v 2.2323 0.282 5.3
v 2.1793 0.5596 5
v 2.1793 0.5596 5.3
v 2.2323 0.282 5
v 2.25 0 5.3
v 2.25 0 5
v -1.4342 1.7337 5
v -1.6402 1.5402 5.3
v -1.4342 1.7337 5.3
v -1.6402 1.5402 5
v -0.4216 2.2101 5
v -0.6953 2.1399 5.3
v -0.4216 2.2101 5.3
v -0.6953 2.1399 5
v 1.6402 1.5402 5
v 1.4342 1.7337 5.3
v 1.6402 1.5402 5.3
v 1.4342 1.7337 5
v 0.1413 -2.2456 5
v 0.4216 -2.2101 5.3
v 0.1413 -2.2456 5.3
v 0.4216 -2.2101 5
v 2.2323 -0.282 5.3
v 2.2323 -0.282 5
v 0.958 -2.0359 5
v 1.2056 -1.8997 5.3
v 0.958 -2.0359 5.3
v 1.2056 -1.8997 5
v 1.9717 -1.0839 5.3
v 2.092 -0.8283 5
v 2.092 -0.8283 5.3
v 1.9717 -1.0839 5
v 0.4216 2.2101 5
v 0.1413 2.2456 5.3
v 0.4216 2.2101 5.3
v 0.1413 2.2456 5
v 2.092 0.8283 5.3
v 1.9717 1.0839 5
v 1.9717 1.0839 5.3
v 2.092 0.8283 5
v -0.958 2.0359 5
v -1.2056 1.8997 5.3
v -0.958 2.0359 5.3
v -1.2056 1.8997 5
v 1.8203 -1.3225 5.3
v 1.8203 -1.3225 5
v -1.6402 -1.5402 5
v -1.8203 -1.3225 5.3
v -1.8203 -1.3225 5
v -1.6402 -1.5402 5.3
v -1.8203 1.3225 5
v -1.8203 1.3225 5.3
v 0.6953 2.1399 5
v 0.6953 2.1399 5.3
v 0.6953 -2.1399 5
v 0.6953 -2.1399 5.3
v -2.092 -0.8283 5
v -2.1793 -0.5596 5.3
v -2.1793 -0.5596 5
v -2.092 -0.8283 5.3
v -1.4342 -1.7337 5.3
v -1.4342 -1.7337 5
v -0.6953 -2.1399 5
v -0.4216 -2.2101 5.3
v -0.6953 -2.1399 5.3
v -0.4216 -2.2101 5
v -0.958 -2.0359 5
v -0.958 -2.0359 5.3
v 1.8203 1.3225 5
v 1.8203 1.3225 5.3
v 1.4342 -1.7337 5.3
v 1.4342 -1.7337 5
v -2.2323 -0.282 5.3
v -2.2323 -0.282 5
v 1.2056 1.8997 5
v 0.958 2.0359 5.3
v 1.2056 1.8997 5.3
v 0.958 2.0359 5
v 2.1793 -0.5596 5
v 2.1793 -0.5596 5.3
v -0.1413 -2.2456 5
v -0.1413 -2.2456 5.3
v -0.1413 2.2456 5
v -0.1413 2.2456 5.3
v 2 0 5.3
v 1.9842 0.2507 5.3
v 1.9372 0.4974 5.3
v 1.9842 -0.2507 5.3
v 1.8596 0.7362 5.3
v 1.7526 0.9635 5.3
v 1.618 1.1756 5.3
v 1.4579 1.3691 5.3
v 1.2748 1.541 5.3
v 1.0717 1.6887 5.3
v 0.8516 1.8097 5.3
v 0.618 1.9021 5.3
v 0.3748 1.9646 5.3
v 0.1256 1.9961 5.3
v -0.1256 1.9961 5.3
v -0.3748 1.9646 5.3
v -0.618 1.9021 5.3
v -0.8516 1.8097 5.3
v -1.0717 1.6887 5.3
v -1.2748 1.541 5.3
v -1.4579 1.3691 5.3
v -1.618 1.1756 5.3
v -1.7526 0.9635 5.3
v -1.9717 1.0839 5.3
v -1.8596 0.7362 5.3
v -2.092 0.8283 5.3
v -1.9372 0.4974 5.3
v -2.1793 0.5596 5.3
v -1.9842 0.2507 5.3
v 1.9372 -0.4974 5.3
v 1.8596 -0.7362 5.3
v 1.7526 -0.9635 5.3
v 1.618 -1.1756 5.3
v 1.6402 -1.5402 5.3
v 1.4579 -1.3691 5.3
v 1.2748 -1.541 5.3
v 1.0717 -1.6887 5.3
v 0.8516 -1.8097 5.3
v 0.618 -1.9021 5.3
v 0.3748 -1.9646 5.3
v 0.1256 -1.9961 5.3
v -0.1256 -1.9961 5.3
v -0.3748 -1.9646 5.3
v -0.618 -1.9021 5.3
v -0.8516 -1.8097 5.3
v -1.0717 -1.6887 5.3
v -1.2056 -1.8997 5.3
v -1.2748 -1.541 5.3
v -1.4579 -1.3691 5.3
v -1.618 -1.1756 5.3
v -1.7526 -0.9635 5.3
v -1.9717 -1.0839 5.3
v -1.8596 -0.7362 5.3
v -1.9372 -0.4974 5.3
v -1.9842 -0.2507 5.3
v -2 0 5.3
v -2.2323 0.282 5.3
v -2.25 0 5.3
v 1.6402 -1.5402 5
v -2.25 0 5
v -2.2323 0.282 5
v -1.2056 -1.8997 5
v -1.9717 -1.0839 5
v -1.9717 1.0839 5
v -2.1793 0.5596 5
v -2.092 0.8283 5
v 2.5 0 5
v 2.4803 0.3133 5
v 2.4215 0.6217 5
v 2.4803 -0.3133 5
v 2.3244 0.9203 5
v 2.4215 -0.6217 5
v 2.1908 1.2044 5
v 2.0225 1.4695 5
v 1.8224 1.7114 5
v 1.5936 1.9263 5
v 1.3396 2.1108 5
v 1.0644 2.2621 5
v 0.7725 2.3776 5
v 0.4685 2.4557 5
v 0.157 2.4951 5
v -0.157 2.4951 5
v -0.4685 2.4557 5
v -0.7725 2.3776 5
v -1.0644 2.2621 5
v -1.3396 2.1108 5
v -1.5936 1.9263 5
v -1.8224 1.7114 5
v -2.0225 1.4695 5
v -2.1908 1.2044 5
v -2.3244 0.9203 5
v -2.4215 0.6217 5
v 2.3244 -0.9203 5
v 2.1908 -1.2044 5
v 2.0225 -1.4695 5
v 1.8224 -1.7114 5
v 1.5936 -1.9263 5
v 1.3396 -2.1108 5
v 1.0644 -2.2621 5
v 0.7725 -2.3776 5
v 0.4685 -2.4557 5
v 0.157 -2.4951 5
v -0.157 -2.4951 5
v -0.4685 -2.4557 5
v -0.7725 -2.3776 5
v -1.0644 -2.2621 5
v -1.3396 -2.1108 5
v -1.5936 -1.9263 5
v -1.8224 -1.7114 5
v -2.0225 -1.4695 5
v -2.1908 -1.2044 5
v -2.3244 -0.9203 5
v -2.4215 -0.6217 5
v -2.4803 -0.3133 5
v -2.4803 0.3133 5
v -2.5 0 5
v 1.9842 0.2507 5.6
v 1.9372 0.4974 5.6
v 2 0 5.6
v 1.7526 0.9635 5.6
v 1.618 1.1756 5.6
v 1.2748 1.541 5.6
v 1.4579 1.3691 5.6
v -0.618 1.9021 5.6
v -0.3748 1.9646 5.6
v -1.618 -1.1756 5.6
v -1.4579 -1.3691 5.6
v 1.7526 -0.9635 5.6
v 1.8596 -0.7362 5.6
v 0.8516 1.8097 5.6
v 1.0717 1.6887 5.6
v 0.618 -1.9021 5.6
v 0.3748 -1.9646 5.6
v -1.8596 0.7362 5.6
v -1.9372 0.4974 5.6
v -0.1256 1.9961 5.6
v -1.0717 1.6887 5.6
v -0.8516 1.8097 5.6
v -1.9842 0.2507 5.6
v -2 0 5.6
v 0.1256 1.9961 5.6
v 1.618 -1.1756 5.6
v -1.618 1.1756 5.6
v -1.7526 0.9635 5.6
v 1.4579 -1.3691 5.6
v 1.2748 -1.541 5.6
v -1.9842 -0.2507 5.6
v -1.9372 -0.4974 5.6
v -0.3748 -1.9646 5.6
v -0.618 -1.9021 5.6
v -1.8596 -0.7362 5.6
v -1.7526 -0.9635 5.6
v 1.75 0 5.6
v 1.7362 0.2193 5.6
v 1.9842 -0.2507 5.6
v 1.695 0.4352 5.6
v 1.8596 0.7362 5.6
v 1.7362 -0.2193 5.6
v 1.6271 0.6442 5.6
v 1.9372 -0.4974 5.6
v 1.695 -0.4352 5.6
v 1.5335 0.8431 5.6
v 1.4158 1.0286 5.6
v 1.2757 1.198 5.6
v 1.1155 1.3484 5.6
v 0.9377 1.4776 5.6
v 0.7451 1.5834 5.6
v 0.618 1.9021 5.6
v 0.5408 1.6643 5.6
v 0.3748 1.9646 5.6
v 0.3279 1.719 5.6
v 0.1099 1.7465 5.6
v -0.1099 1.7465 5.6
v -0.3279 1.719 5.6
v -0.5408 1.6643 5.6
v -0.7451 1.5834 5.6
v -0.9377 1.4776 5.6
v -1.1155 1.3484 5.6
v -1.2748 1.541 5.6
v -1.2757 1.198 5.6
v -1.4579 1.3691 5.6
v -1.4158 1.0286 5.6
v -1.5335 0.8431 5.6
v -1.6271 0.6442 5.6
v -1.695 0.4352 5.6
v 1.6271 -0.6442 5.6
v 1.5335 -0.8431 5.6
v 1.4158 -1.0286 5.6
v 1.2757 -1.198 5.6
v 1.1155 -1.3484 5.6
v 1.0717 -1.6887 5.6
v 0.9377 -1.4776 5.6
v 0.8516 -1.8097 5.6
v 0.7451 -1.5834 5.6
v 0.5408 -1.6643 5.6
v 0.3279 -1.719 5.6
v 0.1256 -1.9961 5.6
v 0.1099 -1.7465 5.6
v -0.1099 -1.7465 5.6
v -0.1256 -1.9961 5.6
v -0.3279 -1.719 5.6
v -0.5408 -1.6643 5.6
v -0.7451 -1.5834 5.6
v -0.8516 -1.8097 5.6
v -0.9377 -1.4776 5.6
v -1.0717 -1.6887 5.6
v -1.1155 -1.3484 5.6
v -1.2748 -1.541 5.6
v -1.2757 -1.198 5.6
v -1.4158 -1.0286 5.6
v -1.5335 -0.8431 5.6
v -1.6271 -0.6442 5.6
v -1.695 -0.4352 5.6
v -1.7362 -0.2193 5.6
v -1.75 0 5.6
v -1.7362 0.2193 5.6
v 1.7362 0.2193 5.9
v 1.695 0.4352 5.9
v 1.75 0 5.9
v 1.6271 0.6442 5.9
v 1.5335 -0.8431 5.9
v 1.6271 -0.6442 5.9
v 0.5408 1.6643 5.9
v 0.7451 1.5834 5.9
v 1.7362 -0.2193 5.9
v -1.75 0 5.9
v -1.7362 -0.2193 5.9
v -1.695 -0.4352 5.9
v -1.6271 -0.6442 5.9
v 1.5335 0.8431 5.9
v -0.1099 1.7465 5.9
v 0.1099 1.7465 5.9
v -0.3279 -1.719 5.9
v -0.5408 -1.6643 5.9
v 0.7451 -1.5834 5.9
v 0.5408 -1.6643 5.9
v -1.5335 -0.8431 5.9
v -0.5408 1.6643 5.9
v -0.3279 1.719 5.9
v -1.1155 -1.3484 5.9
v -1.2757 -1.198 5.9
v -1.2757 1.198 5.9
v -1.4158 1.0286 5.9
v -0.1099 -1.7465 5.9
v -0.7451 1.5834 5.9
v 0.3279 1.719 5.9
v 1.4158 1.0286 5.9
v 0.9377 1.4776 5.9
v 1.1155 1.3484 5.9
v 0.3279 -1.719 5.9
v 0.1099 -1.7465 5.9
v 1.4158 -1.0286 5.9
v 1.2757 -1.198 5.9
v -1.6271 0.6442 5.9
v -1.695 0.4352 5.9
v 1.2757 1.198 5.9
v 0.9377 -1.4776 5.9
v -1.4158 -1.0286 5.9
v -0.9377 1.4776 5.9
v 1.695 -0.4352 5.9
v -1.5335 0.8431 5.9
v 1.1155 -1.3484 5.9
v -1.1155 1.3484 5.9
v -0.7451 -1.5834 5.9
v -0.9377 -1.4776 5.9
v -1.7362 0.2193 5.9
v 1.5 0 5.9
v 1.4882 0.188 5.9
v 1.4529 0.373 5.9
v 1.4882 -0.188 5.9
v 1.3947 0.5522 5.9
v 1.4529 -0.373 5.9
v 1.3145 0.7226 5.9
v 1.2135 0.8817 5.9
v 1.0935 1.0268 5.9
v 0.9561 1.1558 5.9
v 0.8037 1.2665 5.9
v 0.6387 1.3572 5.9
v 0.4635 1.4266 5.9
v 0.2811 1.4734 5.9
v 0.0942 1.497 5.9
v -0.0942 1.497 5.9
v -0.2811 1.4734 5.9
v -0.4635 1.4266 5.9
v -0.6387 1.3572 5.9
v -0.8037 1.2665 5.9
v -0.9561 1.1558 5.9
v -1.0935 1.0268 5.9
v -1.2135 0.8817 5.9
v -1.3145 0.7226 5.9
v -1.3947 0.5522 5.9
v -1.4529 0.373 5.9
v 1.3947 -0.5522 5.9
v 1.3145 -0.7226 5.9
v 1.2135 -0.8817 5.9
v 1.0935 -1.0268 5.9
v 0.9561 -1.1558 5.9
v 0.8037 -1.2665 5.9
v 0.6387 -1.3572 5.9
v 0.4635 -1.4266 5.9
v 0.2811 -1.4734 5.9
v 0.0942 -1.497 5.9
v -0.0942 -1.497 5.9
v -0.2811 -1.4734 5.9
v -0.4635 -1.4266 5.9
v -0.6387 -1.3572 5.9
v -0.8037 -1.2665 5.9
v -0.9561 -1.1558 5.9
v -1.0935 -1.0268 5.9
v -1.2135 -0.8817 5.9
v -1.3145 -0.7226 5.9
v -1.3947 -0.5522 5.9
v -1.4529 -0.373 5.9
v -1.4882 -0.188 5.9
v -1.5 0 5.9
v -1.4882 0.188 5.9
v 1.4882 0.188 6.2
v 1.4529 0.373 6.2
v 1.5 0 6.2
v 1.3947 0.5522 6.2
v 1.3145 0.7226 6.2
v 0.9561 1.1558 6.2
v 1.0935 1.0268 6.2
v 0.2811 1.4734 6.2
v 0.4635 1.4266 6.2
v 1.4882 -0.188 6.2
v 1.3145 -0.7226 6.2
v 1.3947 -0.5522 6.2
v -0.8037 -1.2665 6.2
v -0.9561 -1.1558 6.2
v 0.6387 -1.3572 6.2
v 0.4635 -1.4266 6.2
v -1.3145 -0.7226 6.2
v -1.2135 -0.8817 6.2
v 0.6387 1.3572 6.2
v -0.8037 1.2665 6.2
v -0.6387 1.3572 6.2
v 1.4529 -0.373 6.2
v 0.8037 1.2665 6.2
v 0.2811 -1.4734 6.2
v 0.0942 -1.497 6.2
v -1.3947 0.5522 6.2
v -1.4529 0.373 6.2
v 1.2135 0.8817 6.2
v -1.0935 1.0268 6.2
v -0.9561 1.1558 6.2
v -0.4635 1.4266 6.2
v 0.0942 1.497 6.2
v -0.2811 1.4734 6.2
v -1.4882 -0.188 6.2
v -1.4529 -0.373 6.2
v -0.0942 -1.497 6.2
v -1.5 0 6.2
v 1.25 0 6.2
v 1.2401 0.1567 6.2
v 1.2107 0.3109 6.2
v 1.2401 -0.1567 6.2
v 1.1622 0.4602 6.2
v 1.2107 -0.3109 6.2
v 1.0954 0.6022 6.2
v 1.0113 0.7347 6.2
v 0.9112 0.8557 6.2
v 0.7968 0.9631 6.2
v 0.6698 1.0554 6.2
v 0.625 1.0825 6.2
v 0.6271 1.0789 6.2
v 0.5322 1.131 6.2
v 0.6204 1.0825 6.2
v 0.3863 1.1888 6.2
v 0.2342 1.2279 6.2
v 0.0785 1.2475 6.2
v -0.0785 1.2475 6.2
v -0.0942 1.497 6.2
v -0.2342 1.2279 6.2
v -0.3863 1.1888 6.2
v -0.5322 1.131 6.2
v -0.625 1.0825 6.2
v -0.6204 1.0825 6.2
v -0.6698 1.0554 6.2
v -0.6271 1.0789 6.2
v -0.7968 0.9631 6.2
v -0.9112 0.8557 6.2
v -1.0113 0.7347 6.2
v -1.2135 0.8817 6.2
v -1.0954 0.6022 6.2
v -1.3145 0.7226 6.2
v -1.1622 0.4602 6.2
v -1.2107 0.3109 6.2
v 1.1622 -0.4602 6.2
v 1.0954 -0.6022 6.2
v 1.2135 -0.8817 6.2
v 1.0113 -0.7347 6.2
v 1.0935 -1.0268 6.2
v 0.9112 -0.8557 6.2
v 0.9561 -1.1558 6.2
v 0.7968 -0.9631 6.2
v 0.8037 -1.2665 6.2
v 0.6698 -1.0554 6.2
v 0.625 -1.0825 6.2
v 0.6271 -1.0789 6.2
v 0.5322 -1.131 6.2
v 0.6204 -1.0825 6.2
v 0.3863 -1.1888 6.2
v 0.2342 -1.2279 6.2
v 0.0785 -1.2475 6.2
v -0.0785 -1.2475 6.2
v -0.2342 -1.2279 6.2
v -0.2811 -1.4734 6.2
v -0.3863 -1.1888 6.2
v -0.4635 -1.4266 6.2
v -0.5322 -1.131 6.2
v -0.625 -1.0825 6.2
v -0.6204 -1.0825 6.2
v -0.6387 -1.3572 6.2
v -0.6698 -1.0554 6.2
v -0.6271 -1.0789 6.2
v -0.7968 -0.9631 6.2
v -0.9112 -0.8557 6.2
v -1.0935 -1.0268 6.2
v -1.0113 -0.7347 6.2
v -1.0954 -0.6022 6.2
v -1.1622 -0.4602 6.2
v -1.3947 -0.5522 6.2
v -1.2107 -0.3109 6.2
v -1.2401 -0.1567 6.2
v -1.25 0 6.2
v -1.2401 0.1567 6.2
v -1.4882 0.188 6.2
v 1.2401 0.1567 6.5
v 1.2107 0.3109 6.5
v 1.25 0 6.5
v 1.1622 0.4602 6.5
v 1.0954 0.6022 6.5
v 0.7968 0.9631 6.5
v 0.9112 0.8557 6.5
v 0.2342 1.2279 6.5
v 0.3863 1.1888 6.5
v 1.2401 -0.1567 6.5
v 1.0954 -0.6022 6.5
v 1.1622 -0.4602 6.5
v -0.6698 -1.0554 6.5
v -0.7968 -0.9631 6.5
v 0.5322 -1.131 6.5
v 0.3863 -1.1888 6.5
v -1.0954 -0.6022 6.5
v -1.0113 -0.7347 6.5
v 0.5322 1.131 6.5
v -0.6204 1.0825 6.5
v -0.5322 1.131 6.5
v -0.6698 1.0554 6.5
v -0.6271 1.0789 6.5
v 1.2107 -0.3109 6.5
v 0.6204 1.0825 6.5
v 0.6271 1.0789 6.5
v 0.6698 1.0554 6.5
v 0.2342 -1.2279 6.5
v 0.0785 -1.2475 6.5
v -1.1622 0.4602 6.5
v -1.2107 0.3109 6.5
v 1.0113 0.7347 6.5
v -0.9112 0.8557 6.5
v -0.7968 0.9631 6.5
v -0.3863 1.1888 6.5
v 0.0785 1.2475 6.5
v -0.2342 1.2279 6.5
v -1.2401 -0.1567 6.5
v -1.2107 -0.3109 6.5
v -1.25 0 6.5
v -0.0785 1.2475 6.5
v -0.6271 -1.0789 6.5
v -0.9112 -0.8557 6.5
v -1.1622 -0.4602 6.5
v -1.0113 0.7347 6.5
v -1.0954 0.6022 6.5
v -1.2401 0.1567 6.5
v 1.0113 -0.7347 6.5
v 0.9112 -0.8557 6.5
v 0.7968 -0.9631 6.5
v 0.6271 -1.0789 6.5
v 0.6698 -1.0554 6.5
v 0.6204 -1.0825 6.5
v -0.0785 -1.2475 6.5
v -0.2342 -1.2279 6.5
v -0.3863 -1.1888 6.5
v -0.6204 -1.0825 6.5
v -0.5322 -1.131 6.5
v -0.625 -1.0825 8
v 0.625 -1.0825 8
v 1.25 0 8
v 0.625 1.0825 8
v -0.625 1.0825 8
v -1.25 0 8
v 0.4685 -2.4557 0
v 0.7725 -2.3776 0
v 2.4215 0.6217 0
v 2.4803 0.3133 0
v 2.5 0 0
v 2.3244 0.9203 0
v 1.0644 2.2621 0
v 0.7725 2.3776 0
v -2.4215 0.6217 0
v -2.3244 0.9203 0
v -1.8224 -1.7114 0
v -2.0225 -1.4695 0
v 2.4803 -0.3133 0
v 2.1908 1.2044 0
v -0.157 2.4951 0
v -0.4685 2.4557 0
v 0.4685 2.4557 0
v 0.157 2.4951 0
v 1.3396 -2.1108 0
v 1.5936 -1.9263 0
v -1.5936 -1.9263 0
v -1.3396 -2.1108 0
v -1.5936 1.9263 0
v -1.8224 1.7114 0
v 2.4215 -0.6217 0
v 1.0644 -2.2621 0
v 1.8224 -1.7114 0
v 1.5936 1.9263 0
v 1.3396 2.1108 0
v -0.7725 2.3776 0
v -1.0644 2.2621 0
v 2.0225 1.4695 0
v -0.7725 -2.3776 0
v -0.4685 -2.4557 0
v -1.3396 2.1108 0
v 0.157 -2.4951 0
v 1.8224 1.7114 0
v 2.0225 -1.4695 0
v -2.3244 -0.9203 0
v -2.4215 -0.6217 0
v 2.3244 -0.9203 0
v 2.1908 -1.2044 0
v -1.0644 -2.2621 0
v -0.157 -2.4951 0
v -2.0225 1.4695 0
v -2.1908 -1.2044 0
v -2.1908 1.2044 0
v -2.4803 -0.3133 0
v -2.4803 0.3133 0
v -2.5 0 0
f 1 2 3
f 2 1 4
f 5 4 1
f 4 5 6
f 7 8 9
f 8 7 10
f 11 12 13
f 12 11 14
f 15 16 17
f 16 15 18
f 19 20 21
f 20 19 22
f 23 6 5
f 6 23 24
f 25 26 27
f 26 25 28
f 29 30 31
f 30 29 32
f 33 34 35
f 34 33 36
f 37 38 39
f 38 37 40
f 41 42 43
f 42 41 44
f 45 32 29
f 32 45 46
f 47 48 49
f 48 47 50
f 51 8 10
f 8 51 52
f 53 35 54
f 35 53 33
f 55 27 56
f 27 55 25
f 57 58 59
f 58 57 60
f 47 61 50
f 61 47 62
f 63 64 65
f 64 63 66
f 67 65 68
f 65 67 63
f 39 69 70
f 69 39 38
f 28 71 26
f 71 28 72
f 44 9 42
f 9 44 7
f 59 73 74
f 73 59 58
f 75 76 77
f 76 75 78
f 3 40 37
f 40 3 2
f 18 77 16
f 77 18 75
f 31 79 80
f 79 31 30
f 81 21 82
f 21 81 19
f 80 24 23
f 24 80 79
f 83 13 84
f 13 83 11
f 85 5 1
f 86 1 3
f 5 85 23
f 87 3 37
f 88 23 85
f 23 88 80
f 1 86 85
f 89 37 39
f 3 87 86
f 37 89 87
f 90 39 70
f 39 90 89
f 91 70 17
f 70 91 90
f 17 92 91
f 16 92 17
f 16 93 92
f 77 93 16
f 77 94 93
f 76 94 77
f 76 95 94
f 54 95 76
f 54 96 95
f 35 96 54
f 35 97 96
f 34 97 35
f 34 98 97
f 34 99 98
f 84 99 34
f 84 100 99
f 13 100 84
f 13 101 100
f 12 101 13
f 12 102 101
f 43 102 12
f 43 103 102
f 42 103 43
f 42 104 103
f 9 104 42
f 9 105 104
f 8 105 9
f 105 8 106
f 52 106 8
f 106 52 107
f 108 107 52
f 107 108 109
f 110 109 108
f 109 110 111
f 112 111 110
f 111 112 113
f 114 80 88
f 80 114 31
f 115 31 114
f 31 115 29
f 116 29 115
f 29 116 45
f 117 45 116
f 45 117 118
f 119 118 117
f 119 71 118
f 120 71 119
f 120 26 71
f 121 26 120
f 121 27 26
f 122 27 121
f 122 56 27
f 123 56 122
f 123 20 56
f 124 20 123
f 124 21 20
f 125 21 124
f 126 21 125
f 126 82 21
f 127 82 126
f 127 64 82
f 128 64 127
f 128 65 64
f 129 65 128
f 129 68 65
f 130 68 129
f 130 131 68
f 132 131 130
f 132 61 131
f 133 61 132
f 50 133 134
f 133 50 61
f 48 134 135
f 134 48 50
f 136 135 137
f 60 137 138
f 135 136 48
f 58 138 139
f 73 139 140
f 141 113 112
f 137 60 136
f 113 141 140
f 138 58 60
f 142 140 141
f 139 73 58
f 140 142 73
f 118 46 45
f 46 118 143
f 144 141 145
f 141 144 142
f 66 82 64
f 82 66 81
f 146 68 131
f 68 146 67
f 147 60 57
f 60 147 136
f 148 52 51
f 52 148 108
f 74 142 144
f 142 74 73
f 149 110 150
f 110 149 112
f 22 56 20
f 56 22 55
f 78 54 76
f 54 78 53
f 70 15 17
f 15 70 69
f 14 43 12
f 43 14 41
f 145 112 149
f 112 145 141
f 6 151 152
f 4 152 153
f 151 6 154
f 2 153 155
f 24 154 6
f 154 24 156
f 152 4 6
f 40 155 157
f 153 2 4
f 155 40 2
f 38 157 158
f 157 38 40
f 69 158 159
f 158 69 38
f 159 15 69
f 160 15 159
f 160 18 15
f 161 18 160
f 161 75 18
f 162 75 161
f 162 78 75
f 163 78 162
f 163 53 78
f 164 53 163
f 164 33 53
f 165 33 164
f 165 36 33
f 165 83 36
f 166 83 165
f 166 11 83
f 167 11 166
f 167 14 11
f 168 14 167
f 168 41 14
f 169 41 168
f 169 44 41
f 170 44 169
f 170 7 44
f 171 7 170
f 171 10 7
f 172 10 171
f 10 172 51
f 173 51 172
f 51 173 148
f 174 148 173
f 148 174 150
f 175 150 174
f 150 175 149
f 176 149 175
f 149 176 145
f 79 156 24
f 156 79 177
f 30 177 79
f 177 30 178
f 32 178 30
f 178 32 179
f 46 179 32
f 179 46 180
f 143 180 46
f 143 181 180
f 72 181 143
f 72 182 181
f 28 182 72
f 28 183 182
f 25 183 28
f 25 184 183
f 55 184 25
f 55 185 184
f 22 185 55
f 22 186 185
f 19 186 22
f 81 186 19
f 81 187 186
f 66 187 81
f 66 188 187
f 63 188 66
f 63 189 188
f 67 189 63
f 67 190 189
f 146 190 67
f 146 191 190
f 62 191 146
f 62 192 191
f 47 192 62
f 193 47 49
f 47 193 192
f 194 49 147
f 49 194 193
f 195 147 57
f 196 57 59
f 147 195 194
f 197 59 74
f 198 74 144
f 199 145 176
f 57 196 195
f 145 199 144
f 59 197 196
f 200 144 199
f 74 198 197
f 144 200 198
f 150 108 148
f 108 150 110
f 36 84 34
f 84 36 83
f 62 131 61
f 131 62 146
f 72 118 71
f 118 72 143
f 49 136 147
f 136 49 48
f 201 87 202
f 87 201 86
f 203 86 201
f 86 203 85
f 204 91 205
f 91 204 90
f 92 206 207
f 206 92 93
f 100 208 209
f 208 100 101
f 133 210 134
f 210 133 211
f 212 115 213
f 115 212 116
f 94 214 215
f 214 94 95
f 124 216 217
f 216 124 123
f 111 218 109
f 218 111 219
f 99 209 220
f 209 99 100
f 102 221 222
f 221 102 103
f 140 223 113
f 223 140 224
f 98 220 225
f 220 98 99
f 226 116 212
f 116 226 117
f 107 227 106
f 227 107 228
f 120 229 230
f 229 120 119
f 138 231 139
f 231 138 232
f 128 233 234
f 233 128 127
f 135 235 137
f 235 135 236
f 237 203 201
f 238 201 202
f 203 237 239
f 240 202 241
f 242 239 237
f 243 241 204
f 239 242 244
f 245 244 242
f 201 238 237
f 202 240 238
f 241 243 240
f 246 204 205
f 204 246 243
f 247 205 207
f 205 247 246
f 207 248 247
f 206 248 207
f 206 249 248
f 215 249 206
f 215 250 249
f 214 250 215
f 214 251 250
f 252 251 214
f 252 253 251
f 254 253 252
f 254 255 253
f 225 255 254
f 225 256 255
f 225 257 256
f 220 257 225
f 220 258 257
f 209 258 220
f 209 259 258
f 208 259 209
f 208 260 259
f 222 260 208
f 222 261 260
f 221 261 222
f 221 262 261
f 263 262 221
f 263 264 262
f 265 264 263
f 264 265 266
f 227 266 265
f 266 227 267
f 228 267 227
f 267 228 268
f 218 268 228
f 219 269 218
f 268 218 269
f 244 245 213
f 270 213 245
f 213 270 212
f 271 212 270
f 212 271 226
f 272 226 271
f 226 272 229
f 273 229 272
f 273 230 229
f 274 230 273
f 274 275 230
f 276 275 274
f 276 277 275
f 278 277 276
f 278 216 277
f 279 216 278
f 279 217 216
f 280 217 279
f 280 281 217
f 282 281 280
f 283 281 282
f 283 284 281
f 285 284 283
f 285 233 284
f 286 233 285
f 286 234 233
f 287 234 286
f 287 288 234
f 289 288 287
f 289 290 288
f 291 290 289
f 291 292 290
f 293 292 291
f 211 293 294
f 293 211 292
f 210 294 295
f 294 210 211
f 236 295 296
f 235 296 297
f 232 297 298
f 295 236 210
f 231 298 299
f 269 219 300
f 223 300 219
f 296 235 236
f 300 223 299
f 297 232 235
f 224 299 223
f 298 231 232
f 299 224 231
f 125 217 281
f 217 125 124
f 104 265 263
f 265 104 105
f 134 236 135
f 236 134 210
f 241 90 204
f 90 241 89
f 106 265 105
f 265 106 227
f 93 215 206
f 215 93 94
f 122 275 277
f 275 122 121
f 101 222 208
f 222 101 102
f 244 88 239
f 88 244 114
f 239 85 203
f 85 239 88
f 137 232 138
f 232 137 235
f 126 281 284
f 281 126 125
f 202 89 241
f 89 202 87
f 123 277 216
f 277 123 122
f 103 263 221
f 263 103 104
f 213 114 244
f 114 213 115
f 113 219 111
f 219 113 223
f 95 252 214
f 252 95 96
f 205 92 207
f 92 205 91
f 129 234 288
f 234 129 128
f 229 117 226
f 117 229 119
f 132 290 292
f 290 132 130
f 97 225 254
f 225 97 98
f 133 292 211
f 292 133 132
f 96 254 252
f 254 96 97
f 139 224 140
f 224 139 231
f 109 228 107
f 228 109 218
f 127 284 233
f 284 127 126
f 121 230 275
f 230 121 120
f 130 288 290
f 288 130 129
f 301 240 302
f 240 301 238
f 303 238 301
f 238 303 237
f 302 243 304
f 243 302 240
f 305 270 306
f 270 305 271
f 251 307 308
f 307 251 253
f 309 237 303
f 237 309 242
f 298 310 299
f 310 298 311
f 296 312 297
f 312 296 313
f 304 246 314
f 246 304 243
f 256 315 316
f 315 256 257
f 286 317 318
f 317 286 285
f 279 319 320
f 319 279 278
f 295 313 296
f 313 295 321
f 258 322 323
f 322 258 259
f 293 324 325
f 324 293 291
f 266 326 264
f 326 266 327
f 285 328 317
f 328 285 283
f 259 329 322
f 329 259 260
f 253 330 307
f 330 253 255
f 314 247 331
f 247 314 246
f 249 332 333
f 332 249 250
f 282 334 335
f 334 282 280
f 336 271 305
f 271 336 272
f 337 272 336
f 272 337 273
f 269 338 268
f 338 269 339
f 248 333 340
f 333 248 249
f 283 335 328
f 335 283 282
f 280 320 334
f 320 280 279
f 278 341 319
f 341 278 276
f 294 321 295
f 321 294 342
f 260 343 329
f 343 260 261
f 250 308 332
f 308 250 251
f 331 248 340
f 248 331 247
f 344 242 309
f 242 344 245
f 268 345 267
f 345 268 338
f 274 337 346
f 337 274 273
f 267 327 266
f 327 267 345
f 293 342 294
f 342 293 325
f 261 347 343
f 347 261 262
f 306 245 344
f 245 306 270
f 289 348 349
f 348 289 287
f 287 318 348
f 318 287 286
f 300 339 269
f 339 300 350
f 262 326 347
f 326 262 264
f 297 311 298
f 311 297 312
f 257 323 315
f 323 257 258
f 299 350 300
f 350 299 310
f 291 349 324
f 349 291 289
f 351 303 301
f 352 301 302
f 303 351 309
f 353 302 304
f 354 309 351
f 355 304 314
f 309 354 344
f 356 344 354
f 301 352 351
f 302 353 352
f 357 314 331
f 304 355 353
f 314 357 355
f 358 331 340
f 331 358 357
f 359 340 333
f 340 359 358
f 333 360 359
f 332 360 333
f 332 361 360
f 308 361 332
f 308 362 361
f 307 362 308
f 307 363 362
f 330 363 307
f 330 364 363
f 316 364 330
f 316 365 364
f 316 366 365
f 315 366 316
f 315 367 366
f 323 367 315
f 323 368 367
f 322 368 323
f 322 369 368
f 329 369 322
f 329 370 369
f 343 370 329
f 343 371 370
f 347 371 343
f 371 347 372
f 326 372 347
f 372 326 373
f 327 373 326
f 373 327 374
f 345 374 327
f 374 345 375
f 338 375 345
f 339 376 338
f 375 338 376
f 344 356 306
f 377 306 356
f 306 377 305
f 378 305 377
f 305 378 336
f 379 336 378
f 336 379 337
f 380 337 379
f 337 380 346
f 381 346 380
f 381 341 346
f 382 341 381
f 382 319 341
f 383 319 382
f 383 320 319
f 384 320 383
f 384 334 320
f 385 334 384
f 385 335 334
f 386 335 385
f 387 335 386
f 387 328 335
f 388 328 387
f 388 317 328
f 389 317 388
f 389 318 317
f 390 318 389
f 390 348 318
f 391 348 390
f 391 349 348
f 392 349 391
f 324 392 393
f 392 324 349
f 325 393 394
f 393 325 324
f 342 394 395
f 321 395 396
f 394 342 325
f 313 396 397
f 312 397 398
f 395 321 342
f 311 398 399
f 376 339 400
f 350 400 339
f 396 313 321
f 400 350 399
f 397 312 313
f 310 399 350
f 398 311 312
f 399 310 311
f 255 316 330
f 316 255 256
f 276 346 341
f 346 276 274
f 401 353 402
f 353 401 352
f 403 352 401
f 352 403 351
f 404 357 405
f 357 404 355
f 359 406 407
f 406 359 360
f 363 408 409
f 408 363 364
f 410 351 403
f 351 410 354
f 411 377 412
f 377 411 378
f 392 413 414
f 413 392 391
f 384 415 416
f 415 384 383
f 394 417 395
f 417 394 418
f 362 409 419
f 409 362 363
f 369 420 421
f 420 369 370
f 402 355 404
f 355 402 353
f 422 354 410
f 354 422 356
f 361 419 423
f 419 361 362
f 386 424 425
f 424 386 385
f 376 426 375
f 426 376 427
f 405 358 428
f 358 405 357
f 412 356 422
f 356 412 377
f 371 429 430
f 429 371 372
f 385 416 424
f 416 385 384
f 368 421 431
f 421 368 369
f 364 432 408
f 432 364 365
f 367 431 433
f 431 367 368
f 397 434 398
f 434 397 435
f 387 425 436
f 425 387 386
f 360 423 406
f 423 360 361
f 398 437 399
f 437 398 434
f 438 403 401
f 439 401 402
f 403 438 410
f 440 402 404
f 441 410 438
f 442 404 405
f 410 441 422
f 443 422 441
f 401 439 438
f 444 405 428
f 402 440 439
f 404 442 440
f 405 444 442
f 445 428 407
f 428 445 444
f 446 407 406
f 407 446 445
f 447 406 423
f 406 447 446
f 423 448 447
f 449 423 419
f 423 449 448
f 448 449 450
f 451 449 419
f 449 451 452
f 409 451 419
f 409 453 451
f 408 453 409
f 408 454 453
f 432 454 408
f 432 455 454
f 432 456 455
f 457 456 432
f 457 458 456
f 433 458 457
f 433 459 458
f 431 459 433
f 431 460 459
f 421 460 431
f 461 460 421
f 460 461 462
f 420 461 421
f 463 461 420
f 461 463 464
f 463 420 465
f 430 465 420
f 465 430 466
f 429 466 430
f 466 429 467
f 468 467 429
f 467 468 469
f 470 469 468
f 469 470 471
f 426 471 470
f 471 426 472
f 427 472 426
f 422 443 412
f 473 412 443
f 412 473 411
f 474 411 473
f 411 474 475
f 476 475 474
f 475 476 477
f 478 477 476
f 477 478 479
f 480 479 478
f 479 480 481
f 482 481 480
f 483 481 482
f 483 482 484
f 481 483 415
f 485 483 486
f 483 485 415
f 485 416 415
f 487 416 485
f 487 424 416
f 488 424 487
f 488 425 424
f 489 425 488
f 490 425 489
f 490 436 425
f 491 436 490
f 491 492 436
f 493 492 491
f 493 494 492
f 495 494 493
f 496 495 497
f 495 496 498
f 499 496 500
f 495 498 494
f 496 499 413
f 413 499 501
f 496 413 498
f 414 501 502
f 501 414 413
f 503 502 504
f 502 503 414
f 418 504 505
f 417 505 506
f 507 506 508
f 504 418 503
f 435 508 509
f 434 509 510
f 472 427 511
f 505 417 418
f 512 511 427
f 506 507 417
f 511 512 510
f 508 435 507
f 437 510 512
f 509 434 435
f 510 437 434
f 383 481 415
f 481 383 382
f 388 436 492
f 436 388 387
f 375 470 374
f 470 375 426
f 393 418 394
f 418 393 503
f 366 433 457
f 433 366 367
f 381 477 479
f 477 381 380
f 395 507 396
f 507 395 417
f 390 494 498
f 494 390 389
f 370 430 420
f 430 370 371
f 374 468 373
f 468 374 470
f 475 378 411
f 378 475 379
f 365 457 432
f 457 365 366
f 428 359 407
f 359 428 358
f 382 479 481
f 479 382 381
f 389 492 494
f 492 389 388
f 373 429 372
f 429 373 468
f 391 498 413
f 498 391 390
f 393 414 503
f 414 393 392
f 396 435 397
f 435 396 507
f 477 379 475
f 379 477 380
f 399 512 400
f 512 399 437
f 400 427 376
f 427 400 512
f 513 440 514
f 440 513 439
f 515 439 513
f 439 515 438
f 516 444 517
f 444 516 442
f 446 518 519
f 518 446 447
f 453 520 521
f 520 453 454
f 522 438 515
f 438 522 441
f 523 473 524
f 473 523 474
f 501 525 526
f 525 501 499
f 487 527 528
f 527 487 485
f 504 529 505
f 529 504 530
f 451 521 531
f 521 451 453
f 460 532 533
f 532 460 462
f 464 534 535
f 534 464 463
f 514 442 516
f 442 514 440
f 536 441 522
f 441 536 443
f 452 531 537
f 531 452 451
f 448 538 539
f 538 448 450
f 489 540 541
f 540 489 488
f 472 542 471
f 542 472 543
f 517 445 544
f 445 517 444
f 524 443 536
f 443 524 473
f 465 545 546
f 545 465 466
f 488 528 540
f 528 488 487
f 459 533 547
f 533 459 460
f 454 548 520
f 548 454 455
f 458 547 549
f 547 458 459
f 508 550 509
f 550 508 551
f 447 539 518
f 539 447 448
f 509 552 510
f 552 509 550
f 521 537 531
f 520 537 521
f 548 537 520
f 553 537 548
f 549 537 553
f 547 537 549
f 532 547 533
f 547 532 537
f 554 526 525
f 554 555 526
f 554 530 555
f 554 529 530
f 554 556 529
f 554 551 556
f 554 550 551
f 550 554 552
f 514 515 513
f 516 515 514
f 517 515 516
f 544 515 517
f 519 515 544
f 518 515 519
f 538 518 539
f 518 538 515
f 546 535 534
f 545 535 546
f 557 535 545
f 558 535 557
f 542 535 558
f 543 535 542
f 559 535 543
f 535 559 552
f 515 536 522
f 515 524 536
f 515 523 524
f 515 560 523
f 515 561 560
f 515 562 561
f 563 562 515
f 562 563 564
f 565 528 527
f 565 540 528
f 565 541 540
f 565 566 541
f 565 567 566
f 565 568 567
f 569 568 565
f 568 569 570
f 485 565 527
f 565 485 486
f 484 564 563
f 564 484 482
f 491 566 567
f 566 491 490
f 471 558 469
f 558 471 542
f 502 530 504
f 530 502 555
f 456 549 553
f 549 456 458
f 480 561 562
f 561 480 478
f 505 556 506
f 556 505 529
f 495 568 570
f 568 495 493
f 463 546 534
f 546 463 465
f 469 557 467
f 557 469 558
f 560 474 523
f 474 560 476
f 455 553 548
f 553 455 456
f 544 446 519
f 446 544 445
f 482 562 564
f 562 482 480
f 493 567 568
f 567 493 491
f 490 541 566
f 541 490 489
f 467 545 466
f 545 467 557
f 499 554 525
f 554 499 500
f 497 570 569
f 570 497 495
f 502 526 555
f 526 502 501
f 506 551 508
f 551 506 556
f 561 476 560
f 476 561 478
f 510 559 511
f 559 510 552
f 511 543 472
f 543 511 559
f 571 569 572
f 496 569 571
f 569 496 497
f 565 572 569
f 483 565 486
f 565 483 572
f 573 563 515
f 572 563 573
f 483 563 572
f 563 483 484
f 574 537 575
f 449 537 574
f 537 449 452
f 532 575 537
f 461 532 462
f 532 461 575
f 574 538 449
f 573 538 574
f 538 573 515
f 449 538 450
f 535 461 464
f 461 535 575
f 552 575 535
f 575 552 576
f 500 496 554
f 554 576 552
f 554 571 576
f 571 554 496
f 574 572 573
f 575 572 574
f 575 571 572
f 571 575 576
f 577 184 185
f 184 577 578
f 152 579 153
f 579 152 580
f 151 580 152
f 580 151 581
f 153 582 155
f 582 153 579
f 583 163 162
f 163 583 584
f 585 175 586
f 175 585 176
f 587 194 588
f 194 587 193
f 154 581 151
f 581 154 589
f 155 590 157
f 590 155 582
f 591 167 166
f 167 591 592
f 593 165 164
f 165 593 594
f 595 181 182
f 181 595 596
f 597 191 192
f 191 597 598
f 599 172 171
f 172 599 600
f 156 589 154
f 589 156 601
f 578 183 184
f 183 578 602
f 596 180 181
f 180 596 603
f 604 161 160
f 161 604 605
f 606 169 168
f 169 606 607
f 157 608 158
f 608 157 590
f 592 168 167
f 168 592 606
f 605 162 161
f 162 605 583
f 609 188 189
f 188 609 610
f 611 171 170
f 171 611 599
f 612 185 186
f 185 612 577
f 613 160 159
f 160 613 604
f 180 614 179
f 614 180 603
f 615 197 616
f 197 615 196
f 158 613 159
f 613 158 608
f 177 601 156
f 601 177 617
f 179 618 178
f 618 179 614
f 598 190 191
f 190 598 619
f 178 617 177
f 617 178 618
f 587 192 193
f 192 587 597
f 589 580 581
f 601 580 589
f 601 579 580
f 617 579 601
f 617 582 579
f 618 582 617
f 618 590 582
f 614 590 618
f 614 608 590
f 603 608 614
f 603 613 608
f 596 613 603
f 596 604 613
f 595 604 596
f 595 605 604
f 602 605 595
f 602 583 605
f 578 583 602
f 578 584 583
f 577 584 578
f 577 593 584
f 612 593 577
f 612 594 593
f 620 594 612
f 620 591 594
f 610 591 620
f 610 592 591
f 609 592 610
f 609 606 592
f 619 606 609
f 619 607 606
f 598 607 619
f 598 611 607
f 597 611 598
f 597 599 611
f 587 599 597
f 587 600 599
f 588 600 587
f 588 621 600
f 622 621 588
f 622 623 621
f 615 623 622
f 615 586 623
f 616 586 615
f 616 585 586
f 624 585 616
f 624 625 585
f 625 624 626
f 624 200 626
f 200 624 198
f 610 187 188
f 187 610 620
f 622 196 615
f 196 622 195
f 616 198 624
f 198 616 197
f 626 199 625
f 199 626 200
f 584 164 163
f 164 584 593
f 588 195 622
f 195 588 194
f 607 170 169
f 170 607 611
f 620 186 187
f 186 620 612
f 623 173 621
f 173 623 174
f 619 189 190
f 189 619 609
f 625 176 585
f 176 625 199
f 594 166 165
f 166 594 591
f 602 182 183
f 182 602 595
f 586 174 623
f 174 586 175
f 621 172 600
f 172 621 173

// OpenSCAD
$fn=50;

module propeller_nut_wrench() {
  // M5 Nut Wrench
  wrench_h = 20.0;
  lever_w = 10.0;
  nut_w = 10.0;
  nut_h = 8;

  difference() {
    cylinder(h=wrench_h, r=(nut_w * 1.5) / 2.0, center=true);

    translate([0.0, 0.0, wrench_h / 2.0 - nut_h / 2.0])
      cylinder(h=nut_h + 0.01, r=nut_w / 2.0, $fn=6, center=true);
  }

  translate([0.0, 0.0, - wrench_h / 2.0 + lever_w / 2.0])
    cube([nut_w * 0.8, nut_w * 6.0, lever_w], center=true);
}

module hex_key_tool() {
  tool_w = 5.0;
  tool_h = 5.0;
  bit_w = 2.5;
  bit_h = 3.0;

  // Tool bit
  translate([0, 0, tool_h + bit_h / 2])
    cylinder(r=bit_w / 2, h=bit_h, $fn=6, center=true);

  // Tool connector
  for (i = [0.0:0.1:0.8]) {
    conn_r = (tool_w / 2) * (1.0 - i);
    translate([0, 0, tool_h + (bit_h * i) / 2])
      cylinder(r=conn_r, h=(bit_h * i), center=true);
  }

  // Tool handle
  translate([0, 0, tool_h / 2])
    cylinder(r=tool_w / 2, h=tool_h, center=true);
}

// propeller_nut_wrench();
hex_key_tool();
